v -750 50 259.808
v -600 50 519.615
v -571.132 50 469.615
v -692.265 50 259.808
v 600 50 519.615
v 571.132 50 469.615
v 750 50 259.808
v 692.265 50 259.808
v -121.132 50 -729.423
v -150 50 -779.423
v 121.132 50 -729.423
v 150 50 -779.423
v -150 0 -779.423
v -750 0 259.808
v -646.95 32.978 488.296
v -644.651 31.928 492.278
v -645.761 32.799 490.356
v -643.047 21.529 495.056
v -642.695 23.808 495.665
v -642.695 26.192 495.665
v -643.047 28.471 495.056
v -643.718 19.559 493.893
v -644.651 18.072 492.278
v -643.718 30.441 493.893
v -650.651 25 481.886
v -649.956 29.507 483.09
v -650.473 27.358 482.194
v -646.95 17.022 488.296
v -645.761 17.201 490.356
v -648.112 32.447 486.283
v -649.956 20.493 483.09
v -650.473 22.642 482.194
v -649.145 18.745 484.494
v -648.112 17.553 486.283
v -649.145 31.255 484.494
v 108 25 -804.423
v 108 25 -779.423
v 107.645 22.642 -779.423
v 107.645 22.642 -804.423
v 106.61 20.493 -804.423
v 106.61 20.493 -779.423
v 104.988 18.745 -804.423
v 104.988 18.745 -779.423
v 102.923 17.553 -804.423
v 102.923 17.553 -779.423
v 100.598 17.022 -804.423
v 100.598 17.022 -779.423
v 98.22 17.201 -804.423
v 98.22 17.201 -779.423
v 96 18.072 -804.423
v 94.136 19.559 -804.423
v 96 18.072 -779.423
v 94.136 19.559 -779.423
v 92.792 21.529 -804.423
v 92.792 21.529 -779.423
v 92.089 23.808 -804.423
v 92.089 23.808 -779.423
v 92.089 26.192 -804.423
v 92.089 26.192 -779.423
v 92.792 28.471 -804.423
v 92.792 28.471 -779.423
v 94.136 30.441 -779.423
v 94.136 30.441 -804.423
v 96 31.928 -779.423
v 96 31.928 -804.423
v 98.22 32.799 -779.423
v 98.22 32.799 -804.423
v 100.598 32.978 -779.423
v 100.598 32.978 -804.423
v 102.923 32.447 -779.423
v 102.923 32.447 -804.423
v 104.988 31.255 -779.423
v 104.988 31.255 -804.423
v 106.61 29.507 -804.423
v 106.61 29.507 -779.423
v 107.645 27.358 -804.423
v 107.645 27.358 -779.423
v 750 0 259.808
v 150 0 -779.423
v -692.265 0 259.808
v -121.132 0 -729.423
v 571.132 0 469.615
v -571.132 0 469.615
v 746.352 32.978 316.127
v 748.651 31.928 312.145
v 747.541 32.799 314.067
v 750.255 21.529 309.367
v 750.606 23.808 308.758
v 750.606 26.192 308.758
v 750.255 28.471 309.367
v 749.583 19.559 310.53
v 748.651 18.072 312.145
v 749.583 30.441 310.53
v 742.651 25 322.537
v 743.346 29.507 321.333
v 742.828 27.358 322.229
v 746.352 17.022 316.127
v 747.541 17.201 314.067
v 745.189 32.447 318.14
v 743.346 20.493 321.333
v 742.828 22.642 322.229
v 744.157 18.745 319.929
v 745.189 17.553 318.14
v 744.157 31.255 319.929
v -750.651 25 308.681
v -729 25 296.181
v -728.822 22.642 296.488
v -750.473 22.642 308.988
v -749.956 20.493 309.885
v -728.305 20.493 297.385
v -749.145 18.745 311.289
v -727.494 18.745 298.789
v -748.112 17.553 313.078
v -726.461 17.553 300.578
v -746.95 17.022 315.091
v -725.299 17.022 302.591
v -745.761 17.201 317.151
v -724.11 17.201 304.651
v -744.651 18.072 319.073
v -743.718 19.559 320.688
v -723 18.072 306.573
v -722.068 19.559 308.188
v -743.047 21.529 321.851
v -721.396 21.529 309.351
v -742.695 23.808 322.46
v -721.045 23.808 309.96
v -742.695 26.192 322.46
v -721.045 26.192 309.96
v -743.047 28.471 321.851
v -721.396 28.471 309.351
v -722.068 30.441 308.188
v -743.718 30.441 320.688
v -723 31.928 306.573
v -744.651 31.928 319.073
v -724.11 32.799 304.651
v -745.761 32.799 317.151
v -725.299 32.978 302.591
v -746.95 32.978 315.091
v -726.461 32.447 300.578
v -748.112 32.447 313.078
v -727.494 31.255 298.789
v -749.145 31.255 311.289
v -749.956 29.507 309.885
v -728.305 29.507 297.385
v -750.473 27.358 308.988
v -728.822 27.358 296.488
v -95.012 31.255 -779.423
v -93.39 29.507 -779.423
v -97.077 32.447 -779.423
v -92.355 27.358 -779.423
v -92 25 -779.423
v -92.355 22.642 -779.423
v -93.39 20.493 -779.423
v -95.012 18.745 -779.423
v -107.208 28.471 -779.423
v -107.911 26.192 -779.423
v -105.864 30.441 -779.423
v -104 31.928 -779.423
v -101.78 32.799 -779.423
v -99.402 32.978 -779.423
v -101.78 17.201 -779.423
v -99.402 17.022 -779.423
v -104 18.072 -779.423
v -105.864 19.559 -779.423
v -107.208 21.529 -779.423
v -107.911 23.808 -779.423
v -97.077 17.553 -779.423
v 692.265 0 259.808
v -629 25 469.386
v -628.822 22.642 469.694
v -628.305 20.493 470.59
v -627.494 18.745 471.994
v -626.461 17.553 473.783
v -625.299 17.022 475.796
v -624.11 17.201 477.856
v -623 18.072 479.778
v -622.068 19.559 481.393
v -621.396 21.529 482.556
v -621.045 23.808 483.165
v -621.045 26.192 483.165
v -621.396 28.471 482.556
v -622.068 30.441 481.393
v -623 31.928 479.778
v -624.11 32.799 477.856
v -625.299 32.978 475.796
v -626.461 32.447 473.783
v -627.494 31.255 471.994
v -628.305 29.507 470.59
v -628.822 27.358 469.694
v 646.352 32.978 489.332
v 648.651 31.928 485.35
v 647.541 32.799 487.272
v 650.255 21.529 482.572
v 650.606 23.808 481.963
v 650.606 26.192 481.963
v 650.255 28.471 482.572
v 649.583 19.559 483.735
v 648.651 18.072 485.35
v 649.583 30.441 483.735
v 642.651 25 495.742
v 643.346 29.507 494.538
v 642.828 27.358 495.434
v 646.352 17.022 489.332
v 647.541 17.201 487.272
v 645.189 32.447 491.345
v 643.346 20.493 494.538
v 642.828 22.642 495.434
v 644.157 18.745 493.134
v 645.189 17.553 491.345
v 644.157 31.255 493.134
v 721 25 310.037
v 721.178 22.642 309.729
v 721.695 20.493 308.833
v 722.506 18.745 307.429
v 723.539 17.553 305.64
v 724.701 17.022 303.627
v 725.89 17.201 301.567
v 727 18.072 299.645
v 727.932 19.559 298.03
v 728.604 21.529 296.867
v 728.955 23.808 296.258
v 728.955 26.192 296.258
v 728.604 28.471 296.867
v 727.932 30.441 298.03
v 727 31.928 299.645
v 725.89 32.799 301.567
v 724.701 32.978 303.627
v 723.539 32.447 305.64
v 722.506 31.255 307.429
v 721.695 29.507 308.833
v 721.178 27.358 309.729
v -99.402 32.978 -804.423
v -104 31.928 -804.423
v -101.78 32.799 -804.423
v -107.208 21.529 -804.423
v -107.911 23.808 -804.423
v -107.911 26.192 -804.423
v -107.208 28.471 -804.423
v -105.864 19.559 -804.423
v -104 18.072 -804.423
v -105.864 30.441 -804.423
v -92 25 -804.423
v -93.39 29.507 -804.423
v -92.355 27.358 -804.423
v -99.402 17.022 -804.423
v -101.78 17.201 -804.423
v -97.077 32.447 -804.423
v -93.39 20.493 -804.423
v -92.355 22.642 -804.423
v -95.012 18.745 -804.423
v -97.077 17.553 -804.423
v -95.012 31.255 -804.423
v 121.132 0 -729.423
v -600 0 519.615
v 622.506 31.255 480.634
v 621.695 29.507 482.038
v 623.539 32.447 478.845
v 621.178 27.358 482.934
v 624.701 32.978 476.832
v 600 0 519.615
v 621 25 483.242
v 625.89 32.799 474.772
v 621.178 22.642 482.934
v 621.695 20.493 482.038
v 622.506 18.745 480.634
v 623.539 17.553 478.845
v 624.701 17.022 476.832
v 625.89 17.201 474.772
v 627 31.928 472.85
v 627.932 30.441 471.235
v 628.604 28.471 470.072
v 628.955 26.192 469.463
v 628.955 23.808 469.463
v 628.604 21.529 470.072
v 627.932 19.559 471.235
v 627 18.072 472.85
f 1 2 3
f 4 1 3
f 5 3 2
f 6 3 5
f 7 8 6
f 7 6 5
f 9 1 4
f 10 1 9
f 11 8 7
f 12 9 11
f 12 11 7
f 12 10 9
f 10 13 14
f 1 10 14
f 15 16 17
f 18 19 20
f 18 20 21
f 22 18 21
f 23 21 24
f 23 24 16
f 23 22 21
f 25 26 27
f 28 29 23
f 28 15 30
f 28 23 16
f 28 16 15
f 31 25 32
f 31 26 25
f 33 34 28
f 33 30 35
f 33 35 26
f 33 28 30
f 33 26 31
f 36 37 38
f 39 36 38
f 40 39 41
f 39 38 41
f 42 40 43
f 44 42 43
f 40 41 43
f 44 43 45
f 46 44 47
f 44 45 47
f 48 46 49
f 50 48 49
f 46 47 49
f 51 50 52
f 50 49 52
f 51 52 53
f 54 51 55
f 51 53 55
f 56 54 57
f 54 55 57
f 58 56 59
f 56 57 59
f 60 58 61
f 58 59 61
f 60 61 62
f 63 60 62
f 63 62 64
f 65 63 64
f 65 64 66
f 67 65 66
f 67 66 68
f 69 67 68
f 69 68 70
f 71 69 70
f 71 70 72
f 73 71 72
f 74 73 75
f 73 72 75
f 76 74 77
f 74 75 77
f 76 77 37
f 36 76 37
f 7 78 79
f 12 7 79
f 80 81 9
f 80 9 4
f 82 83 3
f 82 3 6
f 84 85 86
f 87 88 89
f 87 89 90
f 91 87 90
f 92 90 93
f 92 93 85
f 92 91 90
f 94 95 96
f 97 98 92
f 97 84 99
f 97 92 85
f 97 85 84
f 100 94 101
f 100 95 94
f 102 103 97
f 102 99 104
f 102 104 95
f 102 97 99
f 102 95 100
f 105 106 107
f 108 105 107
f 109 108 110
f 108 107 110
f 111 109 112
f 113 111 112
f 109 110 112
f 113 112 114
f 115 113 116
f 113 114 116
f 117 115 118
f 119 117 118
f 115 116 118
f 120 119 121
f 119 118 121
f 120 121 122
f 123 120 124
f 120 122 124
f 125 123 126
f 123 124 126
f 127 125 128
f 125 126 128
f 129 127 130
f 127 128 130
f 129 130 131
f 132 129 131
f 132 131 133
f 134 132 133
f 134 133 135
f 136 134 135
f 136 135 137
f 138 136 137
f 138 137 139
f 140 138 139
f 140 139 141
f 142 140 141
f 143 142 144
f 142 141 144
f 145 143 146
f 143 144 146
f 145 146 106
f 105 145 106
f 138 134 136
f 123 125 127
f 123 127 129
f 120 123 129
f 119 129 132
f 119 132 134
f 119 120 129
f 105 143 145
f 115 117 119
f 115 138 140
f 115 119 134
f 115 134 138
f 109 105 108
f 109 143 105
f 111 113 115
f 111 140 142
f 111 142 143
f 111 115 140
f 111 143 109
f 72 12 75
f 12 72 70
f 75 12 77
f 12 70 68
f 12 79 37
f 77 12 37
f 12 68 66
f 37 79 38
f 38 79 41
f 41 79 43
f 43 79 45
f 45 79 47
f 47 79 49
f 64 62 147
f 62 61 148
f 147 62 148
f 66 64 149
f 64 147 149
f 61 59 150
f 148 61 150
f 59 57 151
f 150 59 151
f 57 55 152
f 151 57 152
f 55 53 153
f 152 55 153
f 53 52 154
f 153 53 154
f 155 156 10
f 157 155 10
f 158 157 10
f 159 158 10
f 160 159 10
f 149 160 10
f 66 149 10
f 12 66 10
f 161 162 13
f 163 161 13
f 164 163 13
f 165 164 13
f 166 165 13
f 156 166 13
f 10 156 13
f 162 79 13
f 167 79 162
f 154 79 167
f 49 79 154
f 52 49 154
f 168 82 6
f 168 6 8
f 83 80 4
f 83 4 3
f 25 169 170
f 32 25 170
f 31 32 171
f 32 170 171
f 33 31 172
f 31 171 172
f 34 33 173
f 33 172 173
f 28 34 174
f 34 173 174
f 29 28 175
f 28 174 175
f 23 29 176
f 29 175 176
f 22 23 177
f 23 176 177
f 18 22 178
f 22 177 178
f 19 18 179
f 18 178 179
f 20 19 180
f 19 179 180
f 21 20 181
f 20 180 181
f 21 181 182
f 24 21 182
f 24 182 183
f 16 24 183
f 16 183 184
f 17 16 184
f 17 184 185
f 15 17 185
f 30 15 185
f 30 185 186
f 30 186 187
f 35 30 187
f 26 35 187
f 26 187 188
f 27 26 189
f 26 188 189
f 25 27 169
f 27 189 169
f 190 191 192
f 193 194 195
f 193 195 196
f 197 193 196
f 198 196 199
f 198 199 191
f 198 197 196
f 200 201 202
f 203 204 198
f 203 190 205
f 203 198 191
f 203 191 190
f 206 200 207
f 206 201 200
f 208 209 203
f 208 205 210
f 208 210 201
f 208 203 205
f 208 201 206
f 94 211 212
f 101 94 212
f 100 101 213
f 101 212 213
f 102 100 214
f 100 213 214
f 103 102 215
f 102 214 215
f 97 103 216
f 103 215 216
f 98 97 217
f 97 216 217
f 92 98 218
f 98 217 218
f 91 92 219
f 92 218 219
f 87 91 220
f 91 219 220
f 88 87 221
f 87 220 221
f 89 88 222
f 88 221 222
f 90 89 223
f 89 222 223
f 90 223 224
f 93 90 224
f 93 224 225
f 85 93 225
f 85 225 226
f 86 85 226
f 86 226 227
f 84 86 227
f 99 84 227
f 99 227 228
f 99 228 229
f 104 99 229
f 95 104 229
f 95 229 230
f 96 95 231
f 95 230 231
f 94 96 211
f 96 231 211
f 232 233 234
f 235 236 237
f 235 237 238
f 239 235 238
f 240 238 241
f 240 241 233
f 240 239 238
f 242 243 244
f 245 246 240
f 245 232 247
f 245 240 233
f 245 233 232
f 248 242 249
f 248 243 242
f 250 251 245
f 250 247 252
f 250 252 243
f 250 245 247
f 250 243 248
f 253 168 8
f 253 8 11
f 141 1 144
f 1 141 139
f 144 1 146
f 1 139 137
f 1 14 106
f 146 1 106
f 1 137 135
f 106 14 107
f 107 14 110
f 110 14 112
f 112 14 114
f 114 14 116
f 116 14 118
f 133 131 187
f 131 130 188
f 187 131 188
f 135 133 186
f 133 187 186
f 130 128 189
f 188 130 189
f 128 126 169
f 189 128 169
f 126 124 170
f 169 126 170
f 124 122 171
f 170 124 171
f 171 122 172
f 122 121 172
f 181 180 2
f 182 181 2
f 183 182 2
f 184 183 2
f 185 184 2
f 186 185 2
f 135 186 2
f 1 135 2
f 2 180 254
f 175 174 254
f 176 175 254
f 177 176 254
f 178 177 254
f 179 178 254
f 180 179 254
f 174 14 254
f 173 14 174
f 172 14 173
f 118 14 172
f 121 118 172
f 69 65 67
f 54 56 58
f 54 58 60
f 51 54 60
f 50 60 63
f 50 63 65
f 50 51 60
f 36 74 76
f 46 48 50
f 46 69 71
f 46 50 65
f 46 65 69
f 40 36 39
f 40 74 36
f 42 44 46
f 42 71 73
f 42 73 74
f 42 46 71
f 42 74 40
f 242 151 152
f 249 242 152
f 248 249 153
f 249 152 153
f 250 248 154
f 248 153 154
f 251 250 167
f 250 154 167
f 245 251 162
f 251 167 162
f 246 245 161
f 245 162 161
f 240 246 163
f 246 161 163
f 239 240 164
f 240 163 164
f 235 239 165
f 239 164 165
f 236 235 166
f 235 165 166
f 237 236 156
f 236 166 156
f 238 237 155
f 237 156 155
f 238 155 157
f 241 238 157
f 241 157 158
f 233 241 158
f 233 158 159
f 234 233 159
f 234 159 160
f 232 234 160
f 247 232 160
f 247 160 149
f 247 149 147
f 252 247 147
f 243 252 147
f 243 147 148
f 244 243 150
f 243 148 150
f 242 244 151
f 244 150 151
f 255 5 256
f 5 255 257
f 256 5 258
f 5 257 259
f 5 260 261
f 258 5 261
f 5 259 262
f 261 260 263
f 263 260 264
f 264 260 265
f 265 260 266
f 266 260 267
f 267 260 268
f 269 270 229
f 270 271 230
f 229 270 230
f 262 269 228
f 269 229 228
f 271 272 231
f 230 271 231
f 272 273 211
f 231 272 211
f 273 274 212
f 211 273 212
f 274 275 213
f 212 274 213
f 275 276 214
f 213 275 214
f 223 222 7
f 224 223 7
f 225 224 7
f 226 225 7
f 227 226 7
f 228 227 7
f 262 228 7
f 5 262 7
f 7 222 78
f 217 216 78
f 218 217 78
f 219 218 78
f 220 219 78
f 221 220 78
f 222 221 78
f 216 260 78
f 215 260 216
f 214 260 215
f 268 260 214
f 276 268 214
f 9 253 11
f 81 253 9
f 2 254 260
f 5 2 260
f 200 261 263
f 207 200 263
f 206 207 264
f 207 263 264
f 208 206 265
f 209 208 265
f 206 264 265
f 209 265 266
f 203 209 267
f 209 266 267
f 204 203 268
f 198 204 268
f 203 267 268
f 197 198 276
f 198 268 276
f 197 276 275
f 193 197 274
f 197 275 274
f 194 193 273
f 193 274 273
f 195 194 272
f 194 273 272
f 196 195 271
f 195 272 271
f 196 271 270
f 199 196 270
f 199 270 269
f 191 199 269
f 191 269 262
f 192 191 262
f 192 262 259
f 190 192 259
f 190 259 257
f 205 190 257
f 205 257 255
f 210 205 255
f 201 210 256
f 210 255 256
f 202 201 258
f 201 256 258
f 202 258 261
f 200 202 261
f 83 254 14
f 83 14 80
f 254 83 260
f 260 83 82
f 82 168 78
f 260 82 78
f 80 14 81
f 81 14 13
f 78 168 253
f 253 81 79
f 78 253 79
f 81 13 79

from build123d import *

# Parameters (mm, degrees)
BOSS_EXTRUDE1_DEPTH = 50
SKETCH2_R           = 8
BOSS_EXTRUDE2_DEPTH = 25
CIRPATTERN1_COUNT   = 3


with BuildPart() as part:
    # Sketch1 → Boss-Extrude1 (new body)
    with BuildSketch(Plane(origin=(0, 0, 0), x_dir=(1, 0, 0), z_dir=(0, 1, 0))):
        Polygon((-600, -519.615242271), (600, -519.615242271), (750, -259.807621135), (150, 779.422863406), (-150, 779.422863406), (-750, -259.807621135), align=None)
        Polygon((-121.132486541, 729.422863406), (-692.264973081, -259.807621135), (-571.132486541, -469.615242271), (571.132486541, -469.615242271), (692.264973081, -259.807621135), (121.132486541, 729.422863406), align=None, mode=Mode.SUBTRACT)
    extrude(amount=BOSS_EXTRUDE1_DEPTH)

    # Sketch2 → Boss-Extrude2 (add)
    with BuildSketch(Plane(origin=(675, 0, 389.711431703), x_dir=(0.5000000000000172, 0, -0.8660254037844287), z_dir=(0.8660254037844287, 0, 0.5000000000000172))):
        with Locations((-100, 25)):
            Circle(SKETCH2_R)
        with Locations((100, 25)):
            Circle(SKETCH2_R)
    boss_extrude2 = extrude(amount=BOSS_EXTRUDE2_DEPTH)

    # CirPattern1: Boss-Extrude2 ×3 about axis
    cirpattern1_axis = Axis((0, 52.5, 0), (0, -1, 0))
    for i in range(1, CIRPATTERN1_COUNT):
        add(boss_extrude2.rotate(cirpattern1_axis, i * 360 / CIRPATTERN1_COUNT))


solid = part.part
